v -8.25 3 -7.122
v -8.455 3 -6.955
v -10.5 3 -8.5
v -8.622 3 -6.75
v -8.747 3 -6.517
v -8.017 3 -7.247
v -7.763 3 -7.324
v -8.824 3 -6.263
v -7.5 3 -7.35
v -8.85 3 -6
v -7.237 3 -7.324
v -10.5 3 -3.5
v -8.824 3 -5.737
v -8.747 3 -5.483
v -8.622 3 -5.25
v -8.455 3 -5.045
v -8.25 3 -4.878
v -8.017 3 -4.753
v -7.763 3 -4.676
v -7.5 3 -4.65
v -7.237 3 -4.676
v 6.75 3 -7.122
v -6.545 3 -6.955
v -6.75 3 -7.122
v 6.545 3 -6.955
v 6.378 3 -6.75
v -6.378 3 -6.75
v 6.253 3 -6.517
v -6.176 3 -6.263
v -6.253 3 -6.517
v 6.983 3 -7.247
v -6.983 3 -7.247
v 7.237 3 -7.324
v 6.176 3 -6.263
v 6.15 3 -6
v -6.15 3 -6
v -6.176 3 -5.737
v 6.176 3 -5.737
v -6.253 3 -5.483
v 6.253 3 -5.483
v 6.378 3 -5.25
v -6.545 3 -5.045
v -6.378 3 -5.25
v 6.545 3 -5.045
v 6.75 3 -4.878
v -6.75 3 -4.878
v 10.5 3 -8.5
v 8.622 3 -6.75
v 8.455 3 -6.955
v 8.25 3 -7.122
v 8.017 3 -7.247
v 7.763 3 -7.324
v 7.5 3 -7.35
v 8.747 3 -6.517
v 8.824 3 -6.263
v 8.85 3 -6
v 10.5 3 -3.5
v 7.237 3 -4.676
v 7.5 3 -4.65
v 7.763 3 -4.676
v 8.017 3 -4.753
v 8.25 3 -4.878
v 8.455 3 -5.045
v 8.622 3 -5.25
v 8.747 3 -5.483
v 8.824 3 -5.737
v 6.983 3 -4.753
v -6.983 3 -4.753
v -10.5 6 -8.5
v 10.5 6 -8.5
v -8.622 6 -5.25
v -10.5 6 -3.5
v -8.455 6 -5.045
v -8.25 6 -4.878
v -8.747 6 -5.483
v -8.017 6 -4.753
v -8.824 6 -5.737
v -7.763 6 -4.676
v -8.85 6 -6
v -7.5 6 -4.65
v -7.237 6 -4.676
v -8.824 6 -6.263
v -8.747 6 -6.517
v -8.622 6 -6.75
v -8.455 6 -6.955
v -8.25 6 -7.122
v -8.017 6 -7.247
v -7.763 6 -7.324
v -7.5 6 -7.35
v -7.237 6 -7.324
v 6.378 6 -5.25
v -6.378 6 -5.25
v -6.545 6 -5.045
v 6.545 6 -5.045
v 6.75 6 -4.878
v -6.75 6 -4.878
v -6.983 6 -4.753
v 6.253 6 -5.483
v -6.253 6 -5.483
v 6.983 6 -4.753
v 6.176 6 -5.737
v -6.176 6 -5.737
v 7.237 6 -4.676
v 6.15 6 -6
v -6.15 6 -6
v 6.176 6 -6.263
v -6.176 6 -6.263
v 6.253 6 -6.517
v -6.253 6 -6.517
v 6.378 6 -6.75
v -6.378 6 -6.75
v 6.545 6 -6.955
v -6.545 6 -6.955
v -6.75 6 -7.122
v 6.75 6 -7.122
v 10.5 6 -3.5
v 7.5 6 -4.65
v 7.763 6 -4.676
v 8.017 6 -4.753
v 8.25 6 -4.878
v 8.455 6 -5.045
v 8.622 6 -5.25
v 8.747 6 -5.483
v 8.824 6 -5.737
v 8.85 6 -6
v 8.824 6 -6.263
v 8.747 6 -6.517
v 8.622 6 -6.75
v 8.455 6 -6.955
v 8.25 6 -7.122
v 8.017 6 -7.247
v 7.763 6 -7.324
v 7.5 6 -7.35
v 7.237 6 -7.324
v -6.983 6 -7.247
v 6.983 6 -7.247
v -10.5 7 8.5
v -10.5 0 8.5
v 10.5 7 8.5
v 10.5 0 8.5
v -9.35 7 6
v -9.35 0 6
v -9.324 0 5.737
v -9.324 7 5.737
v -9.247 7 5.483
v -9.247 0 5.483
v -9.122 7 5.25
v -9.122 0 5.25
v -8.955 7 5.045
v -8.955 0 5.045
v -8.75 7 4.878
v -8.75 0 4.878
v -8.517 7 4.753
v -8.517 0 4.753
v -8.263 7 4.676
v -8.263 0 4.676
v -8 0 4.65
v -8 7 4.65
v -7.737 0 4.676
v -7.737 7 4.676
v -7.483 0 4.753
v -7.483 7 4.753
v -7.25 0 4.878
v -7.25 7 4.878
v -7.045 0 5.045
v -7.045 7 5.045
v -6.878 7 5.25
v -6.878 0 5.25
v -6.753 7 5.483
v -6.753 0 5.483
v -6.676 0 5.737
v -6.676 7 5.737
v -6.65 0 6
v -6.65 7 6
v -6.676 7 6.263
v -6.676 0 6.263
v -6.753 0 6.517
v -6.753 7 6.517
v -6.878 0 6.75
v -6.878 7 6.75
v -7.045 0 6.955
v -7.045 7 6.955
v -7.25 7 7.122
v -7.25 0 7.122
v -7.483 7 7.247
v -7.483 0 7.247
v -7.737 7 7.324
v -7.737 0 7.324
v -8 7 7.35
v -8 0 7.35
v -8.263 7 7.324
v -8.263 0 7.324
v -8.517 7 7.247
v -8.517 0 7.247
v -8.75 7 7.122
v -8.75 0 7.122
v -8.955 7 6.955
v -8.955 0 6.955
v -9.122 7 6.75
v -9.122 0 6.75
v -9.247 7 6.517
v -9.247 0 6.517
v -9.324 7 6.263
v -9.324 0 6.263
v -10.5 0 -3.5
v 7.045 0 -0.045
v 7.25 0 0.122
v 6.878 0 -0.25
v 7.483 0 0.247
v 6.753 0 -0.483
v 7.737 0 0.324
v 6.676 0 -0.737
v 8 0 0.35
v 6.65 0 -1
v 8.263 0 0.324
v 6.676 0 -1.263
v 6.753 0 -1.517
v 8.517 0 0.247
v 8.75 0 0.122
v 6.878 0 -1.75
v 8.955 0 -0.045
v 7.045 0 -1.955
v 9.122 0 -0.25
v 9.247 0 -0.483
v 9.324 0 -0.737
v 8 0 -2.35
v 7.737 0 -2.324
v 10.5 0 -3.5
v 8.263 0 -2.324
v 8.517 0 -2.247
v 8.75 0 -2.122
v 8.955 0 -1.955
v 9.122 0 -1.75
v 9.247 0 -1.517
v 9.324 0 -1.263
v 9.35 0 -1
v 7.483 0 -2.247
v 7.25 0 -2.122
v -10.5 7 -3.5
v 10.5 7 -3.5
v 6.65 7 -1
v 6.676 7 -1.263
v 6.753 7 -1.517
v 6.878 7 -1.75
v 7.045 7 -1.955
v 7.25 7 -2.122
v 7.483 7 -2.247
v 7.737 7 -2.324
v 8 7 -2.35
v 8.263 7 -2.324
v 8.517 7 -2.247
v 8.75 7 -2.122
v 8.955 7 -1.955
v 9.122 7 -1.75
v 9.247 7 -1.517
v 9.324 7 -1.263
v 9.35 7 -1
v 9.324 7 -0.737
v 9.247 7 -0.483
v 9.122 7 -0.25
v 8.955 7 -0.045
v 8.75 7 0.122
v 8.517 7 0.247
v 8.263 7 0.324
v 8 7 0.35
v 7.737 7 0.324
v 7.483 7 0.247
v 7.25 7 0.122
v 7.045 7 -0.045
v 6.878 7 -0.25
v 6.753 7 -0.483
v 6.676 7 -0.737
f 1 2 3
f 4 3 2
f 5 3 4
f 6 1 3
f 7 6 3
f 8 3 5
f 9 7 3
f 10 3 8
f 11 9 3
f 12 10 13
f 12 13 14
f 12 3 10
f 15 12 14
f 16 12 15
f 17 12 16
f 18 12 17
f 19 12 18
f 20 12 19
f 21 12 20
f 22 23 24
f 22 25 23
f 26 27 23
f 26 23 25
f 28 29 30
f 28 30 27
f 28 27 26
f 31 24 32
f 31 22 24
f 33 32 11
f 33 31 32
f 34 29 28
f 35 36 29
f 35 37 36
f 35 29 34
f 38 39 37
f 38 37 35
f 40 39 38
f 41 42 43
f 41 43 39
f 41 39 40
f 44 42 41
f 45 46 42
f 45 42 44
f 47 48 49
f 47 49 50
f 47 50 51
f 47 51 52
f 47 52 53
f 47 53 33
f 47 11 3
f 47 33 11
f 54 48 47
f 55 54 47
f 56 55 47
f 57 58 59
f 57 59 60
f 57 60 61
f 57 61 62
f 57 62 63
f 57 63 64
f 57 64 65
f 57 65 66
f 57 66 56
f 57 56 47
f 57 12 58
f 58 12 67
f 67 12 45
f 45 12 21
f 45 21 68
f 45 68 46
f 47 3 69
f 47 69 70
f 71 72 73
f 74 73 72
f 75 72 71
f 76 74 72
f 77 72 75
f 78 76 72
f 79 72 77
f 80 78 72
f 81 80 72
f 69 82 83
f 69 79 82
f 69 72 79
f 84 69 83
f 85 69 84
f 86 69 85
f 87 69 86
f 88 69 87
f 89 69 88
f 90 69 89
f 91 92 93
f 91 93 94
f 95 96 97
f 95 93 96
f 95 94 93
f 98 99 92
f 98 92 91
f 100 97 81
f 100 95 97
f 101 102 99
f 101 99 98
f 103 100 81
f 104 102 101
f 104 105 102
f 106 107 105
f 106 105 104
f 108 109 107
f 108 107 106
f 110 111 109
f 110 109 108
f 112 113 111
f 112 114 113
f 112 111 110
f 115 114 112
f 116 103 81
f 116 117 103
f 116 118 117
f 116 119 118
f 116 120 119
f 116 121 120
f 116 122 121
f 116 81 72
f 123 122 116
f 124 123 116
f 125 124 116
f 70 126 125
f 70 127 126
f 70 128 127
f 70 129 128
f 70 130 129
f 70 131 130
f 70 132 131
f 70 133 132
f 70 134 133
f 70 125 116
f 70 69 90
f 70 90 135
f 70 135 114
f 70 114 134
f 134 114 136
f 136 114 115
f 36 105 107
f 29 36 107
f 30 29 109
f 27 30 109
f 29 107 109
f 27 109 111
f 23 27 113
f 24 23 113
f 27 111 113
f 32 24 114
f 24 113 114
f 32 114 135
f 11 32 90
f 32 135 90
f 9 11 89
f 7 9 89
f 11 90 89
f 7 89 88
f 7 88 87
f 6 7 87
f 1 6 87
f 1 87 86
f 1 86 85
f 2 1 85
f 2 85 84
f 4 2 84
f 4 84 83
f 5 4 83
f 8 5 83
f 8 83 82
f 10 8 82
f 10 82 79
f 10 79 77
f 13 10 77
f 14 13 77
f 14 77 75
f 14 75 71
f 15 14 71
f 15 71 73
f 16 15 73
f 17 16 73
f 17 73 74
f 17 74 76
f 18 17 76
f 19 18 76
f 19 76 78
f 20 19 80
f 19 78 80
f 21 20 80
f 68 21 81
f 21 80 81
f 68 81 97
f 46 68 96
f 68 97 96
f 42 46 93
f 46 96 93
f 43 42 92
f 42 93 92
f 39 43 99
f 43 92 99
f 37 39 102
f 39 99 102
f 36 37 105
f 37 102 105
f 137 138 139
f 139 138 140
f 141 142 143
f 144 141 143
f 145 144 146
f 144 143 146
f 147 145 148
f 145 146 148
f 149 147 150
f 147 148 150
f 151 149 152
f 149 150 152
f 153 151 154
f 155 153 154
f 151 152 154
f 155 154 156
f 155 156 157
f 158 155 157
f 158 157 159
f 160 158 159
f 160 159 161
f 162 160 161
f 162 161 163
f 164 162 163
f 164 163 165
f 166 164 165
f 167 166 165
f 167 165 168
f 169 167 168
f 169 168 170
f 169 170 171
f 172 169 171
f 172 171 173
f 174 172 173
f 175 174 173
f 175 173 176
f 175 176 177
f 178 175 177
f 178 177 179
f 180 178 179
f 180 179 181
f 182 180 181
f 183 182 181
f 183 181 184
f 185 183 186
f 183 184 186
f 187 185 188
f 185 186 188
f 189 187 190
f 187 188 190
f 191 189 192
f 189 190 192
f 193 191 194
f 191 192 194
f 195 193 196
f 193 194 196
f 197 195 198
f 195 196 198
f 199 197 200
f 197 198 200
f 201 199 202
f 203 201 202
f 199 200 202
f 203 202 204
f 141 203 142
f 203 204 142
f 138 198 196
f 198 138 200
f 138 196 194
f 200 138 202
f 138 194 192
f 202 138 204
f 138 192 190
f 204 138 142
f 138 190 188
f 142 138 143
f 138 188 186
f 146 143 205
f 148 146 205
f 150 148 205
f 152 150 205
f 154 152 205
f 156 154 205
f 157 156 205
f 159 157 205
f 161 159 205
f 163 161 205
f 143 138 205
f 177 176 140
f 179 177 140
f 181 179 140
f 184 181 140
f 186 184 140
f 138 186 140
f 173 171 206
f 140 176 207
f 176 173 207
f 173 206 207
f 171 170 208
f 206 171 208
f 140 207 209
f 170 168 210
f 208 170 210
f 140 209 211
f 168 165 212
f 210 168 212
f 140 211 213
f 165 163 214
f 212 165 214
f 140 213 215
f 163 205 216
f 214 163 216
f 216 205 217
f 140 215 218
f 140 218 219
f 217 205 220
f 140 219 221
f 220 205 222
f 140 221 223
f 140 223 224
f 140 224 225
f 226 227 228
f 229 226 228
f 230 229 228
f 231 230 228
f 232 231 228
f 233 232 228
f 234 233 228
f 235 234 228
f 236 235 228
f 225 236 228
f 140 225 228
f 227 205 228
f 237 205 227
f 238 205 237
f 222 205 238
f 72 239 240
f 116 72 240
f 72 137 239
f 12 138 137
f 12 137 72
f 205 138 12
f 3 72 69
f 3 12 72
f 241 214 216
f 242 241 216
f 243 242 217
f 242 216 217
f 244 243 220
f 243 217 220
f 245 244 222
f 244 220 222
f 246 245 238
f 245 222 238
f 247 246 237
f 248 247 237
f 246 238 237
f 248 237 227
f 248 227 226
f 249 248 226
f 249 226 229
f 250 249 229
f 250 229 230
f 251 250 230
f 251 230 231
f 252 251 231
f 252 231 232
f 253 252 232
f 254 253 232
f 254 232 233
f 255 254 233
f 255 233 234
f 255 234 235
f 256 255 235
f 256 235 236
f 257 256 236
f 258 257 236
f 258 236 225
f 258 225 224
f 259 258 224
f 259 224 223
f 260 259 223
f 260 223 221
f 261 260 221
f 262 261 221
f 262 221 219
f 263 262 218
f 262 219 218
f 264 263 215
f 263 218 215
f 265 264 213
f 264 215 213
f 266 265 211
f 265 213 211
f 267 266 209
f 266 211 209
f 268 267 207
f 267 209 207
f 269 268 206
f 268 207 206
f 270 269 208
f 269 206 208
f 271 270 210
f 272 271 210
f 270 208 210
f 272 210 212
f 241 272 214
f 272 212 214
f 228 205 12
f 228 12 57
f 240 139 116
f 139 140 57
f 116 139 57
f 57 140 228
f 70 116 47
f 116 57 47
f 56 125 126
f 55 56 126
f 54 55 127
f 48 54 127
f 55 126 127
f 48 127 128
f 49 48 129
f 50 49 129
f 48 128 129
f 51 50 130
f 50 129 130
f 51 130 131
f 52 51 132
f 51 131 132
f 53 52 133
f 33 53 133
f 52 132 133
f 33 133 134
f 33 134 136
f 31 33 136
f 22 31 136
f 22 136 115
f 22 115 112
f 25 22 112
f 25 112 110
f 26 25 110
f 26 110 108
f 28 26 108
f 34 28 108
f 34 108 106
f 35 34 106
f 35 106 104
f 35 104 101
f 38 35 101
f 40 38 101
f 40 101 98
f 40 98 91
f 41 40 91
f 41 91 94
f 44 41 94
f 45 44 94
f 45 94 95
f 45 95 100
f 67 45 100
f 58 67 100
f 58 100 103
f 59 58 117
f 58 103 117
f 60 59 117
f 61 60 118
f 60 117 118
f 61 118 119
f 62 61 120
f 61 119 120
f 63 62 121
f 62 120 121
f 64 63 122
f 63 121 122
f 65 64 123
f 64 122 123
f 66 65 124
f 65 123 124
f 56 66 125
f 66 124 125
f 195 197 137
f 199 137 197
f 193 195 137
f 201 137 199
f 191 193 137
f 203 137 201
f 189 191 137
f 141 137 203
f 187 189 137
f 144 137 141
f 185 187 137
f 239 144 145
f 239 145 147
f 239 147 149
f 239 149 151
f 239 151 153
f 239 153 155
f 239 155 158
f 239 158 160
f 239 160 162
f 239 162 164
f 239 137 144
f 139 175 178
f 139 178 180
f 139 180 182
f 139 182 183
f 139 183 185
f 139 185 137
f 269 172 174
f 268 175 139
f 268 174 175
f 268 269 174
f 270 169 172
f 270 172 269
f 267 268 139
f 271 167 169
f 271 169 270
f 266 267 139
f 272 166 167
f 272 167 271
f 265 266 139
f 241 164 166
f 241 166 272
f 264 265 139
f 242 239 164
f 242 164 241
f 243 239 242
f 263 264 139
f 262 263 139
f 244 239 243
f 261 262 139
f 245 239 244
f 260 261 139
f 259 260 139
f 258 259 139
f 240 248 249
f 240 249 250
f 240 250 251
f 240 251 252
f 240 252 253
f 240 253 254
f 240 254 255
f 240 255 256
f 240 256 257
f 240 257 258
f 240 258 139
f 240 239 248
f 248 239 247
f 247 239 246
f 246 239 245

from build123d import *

# Parameters (mm, degrees)
SKETCH1_W              = 21
SKETCH1_H              = 17
BOSS_EXTRUDE1_DEPTH    = 7
SKETCH2_W              = 21
SKETCH2_H              = 5
CUT_EXTRUDE1_DEPTH     = 1
M2_5_CLEARANCE_HOLE1_D = 2.7
SKETCH5_W              = 21
SKETCH5_H              = 5
CUT_EXTRUDE2_DEPTH     = 3
M2_5_CLEARANCE_HOLE2_D = 2.7


with BuildPart() as part:
    # Sketch1 → Boss-Extrude1 (new body)
    with BuildSketch(Plane(origin=(0, 0, 0), x_dir=(1, 0, 0), z_dir=(0, 1, 0))):
        Rectangle(SKETCH1_W, SKETCH1_H)
    extrude(amount=BOSS_EXTRUDE1_DEPTH)

    # Sketch2 → Cut-Extrude1 (cut)
    with BuildSketch(Plane(origin=(0, 7, 0), x_dir=(1, 0, 0), z_dir=(0, 1, 0))):
        with Locations((0, 6)):
            Rectangle(SKETCH2_W, SKETCH2_H)
    extrude(amount=-CUT_EXTRUDE1_DEPTH, mode=Mode.SUBTRACT)

    # M2.5 Clearance Hole1 (through all)
    with Locations(Plane(origin=(0, 7, 0), x_dir=(1, 0, 0), z_dir=(0, 1, 0))):
        with Locations((-8, -6), (8, 1)):
            Hole(M2_5_CLEARANCE_HOLE1_D / 2)

    # Sketch5 → Cut-Extrude2 (cut)
    with BuildSketch(Plane.XZ):
        with Locations((0, -6)):
            Rectangle(SKETCH5_W, SKETCH5_H)
    extrude(amount=-CUT_EXTRUDE2_DEPTH, mode=Mode.SUBTRACT)

    # M2.5 Clearance Hole2 (through all)
    with Locations(Plane(origin=(0, 3, 0), x_dir=(-1, 0, 0), z_dir=(0, -1, 0))):
        with Locations((-7.5, 6), (7.5, 6)):
            Hole(M2_5_CLEARANCE_HOLE2_D / 2)


solid = part.part
